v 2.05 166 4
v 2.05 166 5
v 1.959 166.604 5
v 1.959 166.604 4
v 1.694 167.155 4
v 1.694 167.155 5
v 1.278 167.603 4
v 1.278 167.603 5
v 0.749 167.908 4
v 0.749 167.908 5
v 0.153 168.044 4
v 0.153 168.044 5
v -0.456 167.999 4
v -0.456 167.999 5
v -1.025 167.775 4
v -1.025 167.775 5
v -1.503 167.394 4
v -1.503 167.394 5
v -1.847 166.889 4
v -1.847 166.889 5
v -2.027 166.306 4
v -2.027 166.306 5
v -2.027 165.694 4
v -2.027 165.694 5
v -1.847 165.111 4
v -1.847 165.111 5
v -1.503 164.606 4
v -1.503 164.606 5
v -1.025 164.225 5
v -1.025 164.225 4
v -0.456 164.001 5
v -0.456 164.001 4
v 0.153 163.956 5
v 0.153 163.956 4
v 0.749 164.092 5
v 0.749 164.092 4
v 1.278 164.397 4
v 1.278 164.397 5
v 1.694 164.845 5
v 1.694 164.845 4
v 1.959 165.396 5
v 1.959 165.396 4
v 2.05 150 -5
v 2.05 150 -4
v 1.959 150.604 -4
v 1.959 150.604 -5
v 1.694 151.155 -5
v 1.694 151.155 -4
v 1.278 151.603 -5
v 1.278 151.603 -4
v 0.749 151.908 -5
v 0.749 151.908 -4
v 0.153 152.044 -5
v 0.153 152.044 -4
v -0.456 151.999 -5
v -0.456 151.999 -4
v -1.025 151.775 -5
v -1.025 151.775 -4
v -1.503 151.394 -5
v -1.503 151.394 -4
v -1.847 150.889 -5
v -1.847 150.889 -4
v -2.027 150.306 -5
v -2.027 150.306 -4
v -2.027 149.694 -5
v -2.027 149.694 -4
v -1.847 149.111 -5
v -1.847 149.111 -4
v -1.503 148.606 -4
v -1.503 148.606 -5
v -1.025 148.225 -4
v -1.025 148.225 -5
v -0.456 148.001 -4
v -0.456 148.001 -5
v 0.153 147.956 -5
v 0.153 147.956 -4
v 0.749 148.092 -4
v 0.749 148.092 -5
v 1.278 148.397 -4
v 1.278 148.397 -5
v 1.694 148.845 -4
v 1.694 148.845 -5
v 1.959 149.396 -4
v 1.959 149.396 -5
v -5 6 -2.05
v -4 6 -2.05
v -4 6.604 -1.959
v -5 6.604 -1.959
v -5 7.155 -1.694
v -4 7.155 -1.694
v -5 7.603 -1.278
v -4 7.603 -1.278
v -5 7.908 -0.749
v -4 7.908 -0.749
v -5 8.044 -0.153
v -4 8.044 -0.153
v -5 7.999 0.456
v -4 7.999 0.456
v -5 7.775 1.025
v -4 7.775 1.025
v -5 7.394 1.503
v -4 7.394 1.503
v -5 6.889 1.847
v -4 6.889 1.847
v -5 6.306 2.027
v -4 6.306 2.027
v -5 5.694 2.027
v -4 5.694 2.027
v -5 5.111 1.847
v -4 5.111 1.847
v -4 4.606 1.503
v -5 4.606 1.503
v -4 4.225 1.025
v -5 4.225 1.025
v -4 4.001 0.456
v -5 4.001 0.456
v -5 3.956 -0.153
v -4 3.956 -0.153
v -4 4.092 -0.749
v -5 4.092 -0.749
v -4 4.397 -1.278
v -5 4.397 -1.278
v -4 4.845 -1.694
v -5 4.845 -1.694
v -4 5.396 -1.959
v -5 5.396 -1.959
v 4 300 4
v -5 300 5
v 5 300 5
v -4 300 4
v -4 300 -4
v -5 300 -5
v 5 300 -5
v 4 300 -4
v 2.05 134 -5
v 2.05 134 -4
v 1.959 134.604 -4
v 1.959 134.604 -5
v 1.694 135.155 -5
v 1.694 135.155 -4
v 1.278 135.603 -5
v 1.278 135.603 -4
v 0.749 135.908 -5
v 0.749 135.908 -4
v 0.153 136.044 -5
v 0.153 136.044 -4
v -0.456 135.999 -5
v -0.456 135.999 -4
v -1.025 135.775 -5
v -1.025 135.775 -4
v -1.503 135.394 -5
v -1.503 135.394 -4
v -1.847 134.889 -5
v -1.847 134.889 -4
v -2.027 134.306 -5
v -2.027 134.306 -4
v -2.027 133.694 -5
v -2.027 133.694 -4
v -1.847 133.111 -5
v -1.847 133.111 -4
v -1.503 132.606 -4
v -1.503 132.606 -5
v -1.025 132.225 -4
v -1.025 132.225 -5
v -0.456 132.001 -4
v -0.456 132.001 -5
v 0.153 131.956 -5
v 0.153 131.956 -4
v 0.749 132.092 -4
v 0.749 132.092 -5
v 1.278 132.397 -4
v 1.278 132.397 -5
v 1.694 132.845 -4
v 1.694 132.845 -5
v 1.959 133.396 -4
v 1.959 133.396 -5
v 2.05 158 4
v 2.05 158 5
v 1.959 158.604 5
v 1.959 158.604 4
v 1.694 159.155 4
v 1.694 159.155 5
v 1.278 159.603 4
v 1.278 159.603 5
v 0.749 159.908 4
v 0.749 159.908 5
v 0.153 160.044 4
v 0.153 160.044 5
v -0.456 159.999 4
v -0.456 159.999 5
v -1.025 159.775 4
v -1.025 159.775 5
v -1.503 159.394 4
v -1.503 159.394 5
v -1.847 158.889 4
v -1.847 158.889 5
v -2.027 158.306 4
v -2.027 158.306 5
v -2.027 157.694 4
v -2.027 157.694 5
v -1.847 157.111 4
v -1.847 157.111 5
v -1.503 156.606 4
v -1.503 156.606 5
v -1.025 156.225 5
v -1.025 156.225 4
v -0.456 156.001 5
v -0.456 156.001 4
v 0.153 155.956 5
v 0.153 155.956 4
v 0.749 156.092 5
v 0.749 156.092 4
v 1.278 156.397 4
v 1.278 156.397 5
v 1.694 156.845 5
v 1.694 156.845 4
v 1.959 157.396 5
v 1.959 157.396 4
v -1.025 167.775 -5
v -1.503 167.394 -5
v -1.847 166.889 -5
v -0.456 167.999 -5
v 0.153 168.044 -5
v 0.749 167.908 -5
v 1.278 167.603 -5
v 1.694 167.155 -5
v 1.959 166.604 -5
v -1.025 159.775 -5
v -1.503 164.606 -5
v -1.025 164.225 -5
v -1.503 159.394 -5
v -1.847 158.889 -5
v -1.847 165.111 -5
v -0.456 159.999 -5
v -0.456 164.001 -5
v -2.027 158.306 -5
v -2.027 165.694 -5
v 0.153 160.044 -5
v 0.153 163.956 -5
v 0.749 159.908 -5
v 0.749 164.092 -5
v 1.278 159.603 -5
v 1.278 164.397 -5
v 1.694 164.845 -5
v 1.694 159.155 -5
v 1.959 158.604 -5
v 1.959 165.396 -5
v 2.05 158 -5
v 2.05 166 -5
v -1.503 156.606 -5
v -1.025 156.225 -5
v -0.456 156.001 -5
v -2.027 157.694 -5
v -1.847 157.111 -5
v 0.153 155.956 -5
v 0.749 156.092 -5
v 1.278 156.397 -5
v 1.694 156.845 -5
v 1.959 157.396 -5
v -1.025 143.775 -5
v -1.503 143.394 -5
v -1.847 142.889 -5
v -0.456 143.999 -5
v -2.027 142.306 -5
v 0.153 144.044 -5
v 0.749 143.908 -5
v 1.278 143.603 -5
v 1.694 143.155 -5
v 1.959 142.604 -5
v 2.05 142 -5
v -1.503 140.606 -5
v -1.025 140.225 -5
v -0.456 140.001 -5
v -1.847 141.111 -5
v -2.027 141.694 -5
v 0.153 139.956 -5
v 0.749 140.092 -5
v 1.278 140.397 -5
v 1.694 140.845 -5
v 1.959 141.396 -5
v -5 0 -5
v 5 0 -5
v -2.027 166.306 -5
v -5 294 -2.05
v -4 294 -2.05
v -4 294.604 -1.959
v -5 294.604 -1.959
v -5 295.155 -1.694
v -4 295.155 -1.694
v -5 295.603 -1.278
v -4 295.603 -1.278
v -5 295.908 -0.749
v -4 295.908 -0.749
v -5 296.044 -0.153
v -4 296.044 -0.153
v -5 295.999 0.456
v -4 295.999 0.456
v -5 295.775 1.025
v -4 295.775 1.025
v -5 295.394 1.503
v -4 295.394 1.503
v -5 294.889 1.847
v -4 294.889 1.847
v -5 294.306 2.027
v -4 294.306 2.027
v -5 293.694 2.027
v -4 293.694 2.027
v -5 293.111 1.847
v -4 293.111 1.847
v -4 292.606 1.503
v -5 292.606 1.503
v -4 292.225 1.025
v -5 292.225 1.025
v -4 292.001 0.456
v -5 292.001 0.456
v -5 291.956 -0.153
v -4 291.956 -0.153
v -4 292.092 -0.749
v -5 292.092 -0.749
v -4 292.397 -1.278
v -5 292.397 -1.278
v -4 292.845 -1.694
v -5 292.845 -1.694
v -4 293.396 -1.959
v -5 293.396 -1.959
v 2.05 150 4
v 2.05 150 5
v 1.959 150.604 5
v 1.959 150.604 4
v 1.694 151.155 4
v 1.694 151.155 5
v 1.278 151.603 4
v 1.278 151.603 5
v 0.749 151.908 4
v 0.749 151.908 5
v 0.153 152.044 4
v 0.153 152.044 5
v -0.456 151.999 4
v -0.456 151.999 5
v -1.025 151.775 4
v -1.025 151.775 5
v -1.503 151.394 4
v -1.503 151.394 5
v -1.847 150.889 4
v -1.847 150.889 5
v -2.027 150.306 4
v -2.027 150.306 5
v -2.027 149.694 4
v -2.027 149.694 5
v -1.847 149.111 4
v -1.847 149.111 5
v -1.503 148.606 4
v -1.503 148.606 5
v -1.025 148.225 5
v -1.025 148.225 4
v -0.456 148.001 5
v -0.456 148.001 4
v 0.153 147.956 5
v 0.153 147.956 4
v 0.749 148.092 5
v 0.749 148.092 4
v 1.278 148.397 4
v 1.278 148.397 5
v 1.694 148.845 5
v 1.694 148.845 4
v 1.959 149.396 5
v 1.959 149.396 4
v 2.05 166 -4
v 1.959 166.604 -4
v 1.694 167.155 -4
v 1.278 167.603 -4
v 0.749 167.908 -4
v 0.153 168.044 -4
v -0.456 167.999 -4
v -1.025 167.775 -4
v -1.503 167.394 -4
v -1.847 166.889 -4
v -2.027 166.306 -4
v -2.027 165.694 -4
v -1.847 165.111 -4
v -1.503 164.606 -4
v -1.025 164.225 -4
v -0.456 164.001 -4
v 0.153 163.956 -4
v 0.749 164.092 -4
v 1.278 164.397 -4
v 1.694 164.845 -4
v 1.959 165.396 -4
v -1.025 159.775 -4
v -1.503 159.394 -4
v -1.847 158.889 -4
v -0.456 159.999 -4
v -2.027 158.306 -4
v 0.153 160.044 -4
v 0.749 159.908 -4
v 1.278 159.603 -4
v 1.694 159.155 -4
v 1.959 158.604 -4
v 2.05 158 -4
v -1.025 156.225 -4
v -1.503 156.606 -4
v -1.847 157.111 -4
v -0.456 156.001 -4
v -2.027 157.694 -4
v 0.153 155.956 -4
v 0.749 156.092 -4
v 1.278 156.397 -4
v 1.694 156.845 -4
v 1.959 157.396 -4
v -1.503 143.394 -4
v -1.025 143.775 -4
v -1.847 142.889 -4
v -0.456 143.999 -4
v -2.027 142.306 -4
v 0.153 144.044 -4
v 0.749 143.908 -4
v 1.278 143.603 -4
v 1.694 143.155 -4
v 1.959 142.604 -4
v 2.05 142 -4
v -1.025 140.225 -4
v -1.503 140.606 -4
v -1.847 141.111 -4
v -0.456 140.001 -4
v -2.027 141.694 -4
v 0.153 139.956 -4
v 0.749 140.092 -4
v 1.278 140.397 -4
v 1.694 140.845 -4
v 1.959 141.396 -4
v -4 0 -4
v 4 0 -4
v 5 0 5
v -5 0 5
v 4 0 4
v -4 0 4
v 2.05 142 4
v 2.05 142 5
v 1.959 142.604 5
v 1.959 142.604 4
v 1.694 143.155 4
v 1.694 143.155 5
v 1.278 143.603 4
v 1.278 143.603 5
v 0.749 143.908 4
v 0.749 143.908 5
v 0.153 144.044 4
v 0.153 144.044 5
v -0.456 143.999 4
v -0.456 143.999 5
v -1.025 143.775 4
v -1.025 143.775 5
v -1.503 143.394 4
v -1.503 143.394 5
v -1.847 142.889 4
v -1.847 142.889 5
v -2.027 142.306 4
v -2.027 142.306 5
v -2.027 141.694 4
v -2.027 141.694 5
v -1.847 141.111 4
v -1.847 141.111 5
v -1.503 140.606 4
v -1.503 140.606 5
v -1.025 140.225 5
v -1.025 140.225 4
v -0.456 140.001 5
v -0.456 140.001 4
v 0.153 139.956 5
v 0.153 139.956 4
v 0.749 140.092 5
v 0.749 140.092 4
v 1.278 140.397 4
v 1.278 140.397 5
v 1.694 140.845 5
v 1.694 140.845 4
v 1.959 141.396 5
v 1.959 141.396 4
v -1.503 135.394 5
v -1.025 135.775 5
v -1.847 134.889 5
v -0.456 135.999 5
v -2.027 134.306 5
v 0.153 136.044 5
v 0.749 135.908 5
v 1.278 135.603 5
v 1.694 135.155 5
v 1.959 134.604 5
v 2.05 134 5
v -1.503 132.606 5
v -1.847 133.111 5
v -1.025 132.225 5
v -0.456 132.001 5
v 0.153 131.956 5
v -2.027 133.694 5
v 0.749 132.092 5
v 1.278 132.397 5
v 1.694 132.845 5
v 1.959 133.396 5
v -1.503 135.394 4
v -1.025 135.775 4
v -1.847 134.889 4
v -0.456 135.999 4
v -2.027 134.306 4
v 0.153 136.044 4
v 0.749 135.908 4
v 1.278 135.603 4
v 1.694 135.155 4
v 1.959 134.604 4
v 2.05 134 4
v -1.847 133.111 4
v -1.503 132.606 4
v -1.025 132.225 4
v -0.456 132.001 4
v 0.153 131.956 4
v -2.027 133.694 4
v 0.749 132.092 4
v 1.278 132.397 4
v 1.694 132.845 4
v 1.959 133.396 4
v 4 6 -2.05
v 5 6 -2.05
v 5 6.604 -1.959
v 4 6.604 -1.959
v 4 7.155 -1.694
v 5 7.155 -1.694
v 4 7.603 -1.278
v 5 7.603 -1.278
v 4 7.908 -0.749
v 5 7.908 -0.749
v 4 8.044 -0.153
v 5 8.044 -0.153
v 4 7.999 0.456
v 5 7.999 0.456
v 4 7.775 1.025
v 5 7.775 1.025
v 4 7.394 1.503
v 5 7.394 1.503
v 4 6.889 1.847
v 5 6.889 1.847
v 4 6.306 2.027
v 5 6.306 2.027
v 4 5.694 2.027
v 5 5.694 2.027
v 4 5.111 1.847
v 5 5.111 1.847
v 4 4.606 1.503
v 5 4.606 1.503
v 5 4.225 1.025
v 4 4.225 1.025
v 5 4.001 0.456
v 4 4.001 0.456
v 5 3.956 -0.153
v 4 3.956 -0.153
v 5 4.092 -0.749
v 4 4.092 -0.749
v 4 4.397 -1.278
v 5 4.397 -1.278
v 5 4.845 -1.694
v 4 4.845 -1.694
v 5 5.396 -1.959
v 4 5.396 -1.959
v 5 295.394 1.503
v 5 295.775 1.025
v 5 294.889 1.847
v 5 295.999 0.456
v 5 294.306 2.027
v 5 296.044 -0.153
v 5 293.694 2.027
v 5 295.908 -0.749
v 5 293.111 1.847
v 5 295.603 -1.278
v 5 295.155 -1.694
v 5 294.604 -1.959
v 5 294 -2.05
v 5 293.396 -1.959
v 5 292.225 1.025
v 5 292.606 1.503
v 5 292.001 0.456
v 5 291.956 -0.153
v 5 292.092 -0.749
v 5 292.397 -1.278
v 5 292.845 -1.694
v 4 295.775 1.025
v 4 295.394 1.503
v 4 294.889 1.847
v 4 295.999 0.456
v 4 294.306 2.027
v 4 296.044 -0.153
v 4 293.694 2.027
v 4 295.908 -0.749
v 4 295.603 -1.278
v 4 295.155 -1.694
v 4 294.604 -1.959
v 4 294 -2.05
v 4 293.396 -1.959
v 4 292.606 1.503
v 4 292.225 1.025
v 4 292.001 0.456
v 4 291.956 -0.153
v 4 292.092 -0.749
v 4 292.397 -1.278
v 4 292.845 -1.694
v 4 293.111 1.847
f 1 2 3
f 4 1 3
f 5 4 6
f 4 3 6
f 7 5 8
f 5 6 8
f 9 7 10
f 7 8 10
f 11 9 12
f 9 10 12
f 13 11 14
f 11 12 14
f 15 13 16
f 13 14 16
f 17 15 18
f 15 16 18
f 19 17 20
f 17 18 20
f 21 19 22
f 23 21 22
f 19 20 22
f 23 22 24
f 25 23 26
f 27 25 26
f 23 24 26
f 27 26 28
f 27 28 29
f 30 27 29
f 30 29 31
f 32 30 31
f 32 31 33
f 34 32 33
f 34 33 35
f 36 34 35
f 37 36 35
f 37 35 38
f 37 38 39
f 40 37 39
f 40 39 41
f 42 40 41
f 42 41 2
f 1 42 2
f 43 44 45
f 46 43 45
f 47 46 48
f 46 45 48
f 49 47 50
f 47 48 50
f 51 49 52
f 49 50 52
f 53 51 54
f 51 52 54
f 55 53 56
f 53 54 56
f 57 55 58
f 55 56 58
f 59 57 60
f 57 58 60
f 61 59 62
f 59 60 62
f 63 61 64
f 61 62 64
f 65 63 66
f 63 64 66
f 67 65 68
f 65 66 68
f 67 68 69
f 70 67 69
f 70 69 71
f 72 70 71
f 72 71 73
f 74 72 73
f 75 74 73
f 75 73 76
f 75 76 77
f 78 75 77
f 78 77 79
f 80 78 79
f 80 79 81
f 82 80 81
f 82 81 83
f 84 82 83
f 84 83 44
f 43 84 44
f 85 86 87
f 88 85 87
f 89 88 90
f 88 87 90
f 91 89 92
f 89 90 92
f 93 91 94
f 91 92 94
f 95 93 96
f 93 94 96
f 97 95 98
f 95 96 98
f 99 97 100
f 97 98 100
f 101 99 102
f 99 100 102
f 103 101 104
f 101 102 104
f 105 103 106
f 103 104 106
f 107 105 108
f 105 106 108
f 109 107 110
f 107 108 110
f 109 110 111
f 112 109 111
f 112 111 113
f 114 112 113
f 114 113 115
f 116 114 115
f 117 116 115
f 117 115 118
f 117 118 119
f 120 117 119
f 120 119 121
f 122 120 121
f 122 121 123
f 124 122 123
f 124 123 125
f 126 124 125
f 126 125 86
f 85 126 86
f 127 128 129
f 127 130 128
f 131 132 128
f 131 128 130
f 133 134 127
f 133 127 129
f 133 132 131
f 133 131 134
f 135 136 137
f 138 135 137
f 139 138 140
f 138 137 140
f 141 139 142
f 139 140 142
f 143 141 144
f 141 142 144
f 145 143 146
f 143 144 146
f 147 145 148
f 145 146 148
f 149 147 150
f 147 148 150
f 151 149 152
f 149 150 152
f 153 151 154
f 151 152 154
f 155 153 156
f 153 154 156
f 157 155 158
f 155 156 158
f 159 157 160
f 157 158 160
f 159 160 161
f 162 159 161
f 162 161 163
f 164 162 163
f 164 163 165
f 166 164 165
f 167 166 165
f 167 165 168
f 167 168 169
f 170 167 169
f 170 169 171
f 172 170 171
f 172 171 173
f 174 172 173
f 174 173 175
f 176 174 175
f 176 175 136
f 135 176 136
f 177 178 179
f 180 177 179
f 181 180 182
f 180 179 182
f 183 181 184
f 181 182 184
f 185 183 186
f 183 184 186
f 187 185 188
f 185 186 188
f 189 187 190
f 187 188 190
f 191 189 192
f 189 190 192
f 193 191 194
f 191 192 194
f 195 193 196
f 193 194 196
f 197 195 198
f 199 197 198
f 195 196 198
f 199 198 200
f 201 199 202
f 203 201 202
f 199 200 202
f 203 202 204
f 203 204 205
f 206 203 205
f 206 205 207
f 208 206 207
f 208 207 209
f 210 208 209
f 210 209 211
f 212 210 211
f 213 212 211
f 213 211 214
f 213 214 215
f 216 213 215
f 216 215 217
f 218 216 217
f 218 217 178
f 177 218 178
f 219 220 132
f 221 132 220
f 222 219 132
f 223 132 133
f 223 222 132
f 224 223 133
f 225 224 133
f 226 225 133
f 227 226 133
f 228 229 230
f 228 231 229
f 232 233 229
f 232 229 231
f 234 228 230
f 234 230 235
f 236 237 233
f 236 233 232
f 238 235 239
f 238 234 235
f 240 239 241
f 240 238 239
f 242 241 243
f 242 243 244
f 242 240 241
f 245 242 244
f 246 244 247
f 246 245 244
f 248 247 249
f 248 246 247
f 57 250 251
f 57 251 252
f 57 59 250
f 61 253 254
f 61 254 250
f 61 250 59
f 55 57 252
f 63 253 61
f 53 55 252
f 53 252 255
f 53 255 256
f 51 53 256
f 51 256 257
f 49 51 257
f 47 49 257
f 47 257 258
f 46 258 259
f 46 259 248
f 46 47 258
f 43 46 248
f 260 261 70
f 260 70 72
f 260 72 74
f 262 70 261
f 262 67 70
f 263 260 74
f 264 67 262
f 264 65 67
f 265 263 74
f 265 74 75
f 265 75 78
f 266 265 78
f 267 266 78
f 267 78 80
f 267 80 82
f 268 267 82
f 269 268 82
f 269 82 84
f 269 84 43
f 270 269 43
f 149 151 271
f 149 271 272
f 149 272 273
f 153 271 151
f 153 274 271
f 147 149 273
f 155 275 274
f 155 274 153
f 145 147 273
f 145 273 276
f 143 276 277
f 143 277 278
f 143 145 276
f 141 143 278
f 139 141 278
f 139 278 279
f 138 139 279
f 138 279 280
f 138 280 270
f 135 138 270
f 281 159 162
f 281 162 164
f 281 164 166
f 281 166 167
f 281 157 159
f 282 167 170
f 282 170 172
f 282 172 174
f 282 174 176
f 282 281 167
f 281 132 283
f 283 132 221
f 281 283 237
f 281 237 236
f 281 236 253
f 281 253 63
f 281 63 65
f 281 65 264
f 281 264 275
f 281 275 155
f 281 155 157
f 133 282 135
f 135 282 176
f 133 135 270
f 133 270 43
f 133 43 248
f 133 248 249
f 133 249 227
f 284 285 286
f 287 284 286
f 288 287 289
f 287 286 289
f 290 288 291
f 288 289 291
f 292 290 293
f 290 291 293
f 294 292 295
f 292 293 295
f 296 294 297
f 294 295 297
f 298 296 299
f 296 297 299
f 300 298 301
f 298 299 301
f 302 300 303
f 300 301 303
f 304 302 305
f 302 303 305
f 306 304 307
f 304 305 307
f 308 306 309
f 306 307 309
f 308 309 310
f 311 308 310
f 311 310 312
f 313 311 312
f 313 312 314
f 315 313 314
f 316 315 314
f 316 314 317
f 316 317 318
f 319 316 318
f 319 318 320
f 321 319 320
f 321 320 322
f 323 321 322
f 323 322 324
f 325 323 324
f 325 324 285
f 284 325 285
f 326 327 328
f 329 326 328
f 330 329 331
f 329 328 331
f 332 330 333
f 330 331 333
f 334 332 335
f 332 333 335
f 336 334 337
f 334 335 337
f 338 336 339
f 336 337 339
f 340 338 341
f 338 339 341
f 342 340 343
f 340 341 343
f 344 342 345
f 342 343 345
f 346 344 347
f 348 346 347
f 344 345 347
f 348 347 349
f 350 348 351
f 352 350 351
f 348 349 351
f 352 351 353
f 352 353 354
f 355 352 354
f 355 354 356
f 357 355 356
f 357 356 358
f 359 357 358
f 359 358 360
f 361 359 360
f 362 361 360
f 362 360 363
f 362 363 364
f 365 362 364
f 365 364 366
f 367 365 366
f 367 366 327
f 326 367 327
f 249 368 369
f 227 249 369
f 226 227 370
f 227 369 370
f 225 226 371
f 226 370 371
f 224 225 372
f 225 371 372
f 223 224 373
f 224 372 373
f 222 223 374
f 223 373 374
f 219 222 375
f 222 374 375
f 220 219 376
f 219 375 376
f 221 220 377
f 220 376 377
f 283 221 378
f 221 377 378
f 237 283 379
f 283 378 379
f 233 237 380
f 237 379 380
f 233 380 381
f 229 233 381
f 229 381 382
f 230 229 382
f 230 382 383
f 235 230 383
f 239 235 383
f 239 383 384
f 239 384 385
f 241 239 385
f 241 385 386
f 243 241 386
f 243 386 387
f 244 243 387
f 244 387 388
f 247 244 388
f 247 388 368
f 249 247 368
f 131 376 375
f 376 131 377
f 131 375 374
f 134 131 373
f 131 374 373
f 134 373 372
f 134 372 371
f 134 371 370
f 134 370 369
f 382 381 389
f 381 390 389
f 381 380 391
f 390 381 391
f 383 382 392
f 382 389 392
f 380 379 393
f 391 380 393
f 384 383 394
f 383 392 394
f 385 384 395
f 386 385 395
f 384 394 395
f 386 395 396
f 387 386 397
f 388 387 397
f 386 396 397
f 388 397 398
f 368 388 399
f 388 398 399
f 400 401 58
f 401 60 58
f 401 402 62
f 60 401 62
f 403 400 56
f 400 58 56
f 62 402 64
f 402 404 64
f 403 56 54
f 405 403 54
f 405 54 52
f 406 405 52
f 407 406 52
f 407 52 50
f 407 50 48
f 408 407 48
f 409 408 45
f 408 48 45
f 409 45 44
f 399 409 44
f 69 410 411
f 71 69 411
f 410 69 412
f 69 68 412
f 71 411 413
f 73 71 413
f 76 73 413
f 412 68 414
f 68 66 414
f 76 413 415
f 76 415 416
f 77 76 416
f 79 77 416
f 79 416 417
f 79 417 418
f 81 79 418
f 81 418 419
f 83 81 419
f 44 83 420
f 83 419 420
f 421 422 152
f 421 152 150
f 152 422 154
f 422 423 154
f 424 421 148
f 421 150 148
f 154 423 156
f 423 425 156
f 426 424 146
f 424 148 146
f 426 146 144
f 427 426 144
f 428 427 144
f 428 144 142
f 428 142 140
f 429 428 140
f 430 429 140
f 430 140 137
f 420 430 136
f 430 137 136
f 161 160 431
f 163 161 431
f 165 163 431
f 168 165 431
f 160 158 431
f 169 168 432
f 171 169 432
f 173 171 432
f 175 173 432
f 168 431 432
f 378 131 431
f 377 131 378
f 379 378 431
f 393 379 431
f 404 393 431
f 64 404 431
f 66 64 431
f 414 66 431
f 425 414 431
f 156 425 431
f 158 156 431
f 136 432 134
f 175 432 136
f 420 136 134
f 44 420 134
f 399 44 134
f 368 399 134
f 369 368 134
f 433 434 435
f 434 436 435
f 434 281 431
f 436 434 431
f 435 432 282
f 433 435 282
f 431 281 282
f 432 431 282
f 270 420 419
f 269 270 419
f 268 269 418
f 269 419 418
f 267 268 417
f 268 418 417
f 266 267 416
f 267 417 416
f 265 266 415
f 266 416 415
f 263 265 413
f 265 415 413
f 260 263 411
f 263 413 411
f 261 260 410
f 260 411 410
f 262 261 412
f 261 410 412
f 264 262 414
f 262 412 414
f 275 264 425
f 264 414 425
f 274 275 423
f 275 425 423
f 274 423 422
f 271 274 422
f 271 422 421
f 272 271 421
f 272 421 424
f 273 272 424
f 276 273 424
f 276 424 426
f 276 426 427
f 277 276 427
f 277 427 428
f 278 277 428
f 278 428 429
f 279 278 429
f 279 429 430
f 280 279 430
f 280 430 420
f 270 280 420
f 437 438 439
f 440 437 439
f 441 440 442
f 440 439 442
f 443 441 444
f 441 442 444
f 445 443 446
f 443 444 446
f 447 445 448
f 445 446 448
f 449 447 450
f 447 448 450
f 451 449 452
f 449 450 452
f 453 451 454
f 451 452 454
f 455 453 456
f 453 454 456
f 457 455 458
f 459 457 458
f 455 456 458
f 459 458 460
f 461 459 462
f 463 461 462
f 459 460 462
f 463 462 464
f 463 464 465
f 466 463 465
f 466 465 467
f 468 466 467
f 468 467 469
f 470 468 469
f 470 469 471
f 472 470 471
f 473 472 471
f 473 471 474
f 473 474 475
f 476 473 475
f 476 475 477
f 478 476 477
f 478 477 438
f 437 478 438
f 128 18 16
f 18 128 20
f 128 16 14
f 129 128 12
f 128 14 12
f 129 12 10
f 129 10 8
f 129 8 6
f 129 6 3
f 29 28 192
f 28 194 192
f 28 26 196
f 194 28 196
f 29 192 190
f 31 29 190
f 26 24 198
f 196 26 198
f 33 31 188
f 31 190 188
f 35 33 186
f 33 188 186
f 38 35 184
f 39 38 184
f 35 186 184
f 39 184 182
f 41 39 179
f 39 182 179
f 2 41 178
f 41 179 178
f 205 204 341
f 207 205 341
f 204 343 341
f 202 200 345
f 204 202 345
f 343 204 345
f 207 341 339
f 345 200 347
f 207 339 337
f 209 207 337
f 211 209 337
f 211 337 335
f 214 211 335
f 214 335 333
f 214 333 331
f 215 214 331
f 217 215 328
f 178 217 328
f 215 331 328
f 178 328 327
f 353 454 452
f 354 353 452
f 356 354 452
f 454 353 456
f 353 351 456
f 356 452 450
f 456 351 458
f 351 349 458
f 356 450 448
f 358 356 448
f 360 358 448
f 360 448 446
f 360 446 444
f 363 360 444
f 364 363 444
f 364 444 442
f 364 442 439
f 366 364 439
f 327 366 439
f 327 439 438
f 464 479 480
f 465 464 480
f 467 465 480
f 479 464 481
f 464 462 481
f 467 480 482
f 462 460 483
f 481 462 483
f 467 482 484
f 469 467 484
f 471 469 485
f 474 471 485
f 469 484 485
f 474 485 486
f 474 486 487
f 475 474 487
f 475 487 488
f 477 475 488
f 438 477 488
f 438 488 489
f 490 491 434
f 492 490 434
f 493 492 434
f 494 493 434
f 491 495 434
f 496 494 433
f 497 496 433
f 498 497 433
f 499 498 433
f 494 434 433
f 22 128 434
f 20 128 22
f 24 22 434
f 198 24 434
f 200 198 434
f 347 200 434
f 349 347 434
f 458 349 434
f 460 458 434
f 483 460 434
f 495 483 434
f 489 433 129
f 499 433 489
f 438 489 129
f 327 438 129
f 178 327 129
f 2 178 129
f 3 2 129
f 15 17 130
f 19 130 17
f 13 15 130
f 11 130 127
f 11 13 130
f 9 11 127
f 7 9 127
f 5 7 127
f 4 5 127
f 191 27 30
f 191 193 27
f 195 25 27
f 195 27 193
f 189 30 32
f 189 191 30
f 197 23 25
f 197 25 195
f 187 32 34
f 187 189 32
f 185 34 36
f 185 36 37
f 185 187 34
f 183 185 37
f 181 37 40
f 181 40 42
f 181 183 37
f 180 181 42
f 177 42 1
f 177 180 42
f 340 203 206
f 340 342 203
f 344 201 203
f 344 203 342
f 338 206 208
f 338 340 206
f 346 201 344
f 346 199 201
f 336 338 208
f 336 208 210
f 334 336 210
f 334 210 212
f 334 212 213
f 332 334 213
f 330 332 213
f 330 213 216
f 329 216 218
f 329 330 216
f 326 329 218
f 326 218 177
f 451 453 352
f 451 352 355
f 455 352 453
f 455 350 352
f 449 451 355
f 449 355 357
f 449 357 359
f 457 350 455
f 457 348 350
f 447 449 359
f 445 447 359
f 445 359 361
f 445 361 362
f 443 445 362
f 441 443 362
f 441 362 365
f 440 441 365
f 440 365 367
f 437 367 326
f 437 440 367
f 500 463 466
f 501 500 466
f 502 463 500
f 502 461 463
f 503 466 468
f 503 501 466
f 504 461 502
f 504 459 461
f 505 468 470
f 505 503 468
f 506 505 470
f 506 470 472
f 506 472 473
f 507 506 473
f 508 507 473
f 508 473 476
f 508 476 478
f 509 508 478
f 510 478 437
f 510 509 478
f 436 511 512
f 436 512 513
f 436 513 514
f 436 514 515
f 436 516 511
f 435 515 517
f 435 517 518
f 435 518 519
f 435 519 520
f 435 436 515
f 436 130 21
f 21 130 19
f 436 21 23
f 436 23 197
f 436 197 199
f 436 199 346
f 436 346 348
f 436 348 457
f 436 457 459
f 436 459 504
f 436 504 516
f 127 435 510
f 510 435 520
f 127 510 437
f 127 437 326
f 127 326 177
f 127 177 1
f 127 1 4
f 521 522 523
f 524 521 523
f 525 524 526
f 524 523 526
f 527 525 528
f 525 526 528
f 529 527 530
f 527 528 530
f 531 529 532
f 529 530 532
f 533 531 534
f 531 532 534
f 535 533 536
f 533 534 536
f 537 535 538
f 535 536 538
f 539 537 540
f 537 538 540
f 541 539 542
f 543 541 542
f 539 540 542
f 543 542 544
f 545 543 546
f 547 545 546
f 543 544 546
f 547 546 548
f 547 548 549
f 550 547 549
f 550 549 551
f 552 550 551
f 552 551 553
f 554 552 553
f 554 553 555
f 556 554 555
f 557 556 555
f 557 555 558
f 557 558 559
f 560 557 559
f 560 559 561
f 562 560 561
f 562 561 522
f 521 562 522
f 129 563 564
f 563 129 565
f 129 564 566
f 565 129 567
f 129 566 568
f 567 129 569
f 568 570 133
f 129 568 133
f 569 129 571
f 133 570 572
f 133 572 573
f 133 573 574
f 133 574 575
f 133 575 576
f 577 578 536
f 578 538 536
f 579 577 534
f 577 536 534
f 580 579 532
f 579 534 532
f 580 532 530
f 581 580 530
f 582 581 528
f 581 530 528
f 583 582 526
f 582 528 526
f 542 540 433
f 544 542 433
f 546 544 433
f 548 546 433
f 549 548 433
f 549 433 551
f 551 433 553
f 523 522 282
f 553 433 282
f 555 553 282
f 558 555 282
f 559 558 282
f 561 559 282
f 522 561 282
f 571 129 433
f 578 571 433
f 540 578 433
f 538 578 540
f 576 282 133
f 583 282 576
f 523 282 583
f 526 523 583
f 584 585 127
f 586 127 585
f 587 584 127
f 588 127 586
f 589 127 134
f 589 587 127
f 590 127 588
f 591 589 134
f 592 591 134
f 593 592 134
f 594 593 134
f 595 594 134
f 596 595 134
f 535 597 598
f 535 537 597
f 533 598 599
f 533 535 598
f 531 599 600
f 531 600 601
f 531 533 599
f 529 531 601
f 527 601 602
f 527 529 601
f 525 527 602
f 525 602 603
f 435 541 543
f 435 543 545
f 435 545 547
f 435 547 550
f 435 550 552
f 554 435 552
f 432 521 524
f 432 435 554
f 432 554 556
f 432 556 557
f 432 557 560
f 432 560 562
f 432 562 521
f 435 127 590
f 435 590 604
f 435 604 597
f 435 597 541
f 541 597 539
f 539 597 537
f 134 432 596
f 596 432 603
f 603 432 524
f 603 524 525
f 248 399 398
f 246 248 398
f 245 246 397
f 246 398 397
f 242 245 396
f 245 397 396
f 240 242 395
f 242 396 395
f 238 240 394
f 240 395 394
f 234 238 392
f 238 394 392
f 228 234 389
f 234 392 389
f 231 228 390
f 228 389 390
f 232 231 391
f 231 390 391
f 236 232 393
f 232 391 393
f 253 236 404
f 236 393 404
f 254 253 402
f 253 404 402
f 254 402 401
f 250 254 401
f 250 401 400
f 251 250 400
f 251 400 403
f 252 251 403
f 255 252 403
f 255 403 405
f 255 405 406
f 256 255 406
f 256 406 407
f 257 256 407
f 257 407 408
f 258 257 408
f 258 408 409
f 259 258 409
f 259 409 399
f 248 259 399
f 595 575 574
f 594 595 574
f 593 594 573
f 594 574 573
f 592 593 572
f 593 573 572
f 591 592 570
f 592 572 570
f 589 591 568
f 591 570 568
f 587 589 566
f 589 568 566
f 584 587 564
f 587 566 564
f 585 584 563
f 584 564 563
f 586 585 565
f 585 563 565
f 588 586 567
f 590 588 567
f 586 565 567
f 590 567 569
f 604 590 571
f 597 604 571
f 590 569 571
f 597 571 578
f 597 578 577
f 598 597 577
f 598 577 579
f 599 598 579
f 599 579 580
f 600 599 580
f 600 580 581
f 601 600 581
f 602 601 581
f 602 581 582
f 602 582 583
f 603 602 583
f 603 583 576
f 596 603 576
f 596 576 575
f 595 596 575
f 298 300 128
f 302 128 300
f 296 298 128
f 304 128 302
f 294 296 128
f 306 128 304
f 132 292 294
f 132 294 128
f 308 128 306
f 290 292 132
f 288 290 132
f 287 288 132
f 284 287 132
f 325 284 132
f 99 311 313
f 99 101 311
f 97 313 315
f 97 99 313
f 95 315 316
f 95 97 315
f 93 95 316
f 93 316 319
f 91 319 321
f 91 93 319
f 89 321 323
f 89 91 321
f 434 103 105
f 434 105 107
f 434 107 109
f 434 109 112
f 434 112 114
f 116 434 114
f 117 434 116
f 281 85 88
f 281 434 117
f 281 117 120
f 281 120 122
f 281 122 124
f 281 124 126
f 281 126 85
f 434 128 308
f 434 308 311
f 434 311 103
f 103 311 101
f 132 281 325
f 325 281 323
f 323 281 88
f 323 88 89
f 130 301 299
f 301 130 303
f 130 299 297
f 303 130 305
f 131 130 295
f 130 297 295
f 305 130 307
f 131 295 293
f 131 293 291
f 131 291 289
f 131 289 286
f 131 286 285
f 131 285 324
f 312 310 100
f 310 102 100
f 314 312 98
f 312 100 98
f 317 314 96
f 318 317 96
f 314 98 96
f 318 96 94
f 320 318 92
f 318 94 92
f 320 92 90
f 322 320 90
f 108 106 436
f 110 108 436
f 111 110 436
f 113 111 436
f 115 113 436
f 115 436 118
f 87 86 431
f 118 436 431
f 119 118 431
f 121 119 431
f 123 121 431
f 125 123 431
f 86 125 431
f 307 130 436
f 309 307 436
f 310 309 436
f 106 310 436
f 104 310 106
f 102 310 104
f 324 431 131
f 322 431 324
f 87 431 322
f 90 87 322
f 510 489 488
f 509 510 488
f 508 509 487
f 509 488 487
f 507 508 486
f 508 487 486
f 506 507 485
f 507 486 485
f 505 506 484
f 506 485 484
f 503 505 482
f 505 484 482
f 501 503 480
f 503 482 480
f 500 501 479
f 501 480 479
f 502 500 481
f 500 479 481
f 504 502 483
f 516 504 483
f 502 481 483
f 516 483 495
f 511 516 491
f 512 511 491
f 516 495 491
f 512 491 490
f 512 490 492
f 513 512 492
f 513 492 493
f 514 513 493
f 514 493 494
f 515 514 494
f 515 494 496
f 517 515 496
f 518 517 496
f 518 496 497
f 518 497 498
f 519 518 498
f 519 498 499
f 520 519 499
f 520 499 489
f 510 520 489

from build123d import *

# Parameters (mm, degrees)
SKETCH1_W           = 10
SKETCH1_H           = 10
SKETCH1_W_2         = 8
SKETCH1_H_2         = 8
BOSS_EXTRUDE1_DEPTH = 300
SKETCH2_R           = 2.05
CUT_EXTRUDE1_DEPTH  = 301.208261046
SKETCH3_R           = 2.05
CUT_EXTRUDE2_DEPTH  = 301.208261046


with BuildPart() as part:
    # Sketch1 → Boss-Extrude1 (new body)
    with BuildSketch(Plane(origin=(0, 0, 0), x_dir=(1, 0, 0), z_dir=(0, 1, 0))):
        Rectangle(SKETCH1_W, SKETCH1_H)
        Rectangle(SKETCH1_W_2, SKETCH1_H_2, mode=Mode.SUBTRACT)
    extrude(amount=BOSS_EXTRUDE1_DEPTH)

    # Sketch2 → Cut-Extrude1 (cut, through all)
    with BuildSketch(Plane(origin=(5, 0, 0), x_dir=(0, 0, -1), z_dir=(1, 0, 0))):
        with Locations((0, 294)):
            Circle(SKETCH2_R)
        with Locations((0, 6)):
            Circle(SKETCH2_R)
    extrude(amount=-CUT_EXTRUDE1_DEPTH, mode=Mode.SUBTRACT)

    # Sketch3 → Cut-Extrude2 (cut, through all)
    with BuildSketch(Plane.XY.offset(5)):
        with Locations((0, 150)):
            Circle(SKETCH3_R)
        with Locations((0, 158)):
            Circle(SKETCH3_R)
        with Locations((0, 166)):
            Circle(SKETCH3_R)
        with Locations((0, 142)):
            Circle(SKETCH3_R)
        with Locations((0, 134)):
            Circle(SKETCH3_R)
    extrude(amount=-CUT_EXTRUDE2_DEPTH, mode=Mode.SUBTRACT)


solid = part.part
